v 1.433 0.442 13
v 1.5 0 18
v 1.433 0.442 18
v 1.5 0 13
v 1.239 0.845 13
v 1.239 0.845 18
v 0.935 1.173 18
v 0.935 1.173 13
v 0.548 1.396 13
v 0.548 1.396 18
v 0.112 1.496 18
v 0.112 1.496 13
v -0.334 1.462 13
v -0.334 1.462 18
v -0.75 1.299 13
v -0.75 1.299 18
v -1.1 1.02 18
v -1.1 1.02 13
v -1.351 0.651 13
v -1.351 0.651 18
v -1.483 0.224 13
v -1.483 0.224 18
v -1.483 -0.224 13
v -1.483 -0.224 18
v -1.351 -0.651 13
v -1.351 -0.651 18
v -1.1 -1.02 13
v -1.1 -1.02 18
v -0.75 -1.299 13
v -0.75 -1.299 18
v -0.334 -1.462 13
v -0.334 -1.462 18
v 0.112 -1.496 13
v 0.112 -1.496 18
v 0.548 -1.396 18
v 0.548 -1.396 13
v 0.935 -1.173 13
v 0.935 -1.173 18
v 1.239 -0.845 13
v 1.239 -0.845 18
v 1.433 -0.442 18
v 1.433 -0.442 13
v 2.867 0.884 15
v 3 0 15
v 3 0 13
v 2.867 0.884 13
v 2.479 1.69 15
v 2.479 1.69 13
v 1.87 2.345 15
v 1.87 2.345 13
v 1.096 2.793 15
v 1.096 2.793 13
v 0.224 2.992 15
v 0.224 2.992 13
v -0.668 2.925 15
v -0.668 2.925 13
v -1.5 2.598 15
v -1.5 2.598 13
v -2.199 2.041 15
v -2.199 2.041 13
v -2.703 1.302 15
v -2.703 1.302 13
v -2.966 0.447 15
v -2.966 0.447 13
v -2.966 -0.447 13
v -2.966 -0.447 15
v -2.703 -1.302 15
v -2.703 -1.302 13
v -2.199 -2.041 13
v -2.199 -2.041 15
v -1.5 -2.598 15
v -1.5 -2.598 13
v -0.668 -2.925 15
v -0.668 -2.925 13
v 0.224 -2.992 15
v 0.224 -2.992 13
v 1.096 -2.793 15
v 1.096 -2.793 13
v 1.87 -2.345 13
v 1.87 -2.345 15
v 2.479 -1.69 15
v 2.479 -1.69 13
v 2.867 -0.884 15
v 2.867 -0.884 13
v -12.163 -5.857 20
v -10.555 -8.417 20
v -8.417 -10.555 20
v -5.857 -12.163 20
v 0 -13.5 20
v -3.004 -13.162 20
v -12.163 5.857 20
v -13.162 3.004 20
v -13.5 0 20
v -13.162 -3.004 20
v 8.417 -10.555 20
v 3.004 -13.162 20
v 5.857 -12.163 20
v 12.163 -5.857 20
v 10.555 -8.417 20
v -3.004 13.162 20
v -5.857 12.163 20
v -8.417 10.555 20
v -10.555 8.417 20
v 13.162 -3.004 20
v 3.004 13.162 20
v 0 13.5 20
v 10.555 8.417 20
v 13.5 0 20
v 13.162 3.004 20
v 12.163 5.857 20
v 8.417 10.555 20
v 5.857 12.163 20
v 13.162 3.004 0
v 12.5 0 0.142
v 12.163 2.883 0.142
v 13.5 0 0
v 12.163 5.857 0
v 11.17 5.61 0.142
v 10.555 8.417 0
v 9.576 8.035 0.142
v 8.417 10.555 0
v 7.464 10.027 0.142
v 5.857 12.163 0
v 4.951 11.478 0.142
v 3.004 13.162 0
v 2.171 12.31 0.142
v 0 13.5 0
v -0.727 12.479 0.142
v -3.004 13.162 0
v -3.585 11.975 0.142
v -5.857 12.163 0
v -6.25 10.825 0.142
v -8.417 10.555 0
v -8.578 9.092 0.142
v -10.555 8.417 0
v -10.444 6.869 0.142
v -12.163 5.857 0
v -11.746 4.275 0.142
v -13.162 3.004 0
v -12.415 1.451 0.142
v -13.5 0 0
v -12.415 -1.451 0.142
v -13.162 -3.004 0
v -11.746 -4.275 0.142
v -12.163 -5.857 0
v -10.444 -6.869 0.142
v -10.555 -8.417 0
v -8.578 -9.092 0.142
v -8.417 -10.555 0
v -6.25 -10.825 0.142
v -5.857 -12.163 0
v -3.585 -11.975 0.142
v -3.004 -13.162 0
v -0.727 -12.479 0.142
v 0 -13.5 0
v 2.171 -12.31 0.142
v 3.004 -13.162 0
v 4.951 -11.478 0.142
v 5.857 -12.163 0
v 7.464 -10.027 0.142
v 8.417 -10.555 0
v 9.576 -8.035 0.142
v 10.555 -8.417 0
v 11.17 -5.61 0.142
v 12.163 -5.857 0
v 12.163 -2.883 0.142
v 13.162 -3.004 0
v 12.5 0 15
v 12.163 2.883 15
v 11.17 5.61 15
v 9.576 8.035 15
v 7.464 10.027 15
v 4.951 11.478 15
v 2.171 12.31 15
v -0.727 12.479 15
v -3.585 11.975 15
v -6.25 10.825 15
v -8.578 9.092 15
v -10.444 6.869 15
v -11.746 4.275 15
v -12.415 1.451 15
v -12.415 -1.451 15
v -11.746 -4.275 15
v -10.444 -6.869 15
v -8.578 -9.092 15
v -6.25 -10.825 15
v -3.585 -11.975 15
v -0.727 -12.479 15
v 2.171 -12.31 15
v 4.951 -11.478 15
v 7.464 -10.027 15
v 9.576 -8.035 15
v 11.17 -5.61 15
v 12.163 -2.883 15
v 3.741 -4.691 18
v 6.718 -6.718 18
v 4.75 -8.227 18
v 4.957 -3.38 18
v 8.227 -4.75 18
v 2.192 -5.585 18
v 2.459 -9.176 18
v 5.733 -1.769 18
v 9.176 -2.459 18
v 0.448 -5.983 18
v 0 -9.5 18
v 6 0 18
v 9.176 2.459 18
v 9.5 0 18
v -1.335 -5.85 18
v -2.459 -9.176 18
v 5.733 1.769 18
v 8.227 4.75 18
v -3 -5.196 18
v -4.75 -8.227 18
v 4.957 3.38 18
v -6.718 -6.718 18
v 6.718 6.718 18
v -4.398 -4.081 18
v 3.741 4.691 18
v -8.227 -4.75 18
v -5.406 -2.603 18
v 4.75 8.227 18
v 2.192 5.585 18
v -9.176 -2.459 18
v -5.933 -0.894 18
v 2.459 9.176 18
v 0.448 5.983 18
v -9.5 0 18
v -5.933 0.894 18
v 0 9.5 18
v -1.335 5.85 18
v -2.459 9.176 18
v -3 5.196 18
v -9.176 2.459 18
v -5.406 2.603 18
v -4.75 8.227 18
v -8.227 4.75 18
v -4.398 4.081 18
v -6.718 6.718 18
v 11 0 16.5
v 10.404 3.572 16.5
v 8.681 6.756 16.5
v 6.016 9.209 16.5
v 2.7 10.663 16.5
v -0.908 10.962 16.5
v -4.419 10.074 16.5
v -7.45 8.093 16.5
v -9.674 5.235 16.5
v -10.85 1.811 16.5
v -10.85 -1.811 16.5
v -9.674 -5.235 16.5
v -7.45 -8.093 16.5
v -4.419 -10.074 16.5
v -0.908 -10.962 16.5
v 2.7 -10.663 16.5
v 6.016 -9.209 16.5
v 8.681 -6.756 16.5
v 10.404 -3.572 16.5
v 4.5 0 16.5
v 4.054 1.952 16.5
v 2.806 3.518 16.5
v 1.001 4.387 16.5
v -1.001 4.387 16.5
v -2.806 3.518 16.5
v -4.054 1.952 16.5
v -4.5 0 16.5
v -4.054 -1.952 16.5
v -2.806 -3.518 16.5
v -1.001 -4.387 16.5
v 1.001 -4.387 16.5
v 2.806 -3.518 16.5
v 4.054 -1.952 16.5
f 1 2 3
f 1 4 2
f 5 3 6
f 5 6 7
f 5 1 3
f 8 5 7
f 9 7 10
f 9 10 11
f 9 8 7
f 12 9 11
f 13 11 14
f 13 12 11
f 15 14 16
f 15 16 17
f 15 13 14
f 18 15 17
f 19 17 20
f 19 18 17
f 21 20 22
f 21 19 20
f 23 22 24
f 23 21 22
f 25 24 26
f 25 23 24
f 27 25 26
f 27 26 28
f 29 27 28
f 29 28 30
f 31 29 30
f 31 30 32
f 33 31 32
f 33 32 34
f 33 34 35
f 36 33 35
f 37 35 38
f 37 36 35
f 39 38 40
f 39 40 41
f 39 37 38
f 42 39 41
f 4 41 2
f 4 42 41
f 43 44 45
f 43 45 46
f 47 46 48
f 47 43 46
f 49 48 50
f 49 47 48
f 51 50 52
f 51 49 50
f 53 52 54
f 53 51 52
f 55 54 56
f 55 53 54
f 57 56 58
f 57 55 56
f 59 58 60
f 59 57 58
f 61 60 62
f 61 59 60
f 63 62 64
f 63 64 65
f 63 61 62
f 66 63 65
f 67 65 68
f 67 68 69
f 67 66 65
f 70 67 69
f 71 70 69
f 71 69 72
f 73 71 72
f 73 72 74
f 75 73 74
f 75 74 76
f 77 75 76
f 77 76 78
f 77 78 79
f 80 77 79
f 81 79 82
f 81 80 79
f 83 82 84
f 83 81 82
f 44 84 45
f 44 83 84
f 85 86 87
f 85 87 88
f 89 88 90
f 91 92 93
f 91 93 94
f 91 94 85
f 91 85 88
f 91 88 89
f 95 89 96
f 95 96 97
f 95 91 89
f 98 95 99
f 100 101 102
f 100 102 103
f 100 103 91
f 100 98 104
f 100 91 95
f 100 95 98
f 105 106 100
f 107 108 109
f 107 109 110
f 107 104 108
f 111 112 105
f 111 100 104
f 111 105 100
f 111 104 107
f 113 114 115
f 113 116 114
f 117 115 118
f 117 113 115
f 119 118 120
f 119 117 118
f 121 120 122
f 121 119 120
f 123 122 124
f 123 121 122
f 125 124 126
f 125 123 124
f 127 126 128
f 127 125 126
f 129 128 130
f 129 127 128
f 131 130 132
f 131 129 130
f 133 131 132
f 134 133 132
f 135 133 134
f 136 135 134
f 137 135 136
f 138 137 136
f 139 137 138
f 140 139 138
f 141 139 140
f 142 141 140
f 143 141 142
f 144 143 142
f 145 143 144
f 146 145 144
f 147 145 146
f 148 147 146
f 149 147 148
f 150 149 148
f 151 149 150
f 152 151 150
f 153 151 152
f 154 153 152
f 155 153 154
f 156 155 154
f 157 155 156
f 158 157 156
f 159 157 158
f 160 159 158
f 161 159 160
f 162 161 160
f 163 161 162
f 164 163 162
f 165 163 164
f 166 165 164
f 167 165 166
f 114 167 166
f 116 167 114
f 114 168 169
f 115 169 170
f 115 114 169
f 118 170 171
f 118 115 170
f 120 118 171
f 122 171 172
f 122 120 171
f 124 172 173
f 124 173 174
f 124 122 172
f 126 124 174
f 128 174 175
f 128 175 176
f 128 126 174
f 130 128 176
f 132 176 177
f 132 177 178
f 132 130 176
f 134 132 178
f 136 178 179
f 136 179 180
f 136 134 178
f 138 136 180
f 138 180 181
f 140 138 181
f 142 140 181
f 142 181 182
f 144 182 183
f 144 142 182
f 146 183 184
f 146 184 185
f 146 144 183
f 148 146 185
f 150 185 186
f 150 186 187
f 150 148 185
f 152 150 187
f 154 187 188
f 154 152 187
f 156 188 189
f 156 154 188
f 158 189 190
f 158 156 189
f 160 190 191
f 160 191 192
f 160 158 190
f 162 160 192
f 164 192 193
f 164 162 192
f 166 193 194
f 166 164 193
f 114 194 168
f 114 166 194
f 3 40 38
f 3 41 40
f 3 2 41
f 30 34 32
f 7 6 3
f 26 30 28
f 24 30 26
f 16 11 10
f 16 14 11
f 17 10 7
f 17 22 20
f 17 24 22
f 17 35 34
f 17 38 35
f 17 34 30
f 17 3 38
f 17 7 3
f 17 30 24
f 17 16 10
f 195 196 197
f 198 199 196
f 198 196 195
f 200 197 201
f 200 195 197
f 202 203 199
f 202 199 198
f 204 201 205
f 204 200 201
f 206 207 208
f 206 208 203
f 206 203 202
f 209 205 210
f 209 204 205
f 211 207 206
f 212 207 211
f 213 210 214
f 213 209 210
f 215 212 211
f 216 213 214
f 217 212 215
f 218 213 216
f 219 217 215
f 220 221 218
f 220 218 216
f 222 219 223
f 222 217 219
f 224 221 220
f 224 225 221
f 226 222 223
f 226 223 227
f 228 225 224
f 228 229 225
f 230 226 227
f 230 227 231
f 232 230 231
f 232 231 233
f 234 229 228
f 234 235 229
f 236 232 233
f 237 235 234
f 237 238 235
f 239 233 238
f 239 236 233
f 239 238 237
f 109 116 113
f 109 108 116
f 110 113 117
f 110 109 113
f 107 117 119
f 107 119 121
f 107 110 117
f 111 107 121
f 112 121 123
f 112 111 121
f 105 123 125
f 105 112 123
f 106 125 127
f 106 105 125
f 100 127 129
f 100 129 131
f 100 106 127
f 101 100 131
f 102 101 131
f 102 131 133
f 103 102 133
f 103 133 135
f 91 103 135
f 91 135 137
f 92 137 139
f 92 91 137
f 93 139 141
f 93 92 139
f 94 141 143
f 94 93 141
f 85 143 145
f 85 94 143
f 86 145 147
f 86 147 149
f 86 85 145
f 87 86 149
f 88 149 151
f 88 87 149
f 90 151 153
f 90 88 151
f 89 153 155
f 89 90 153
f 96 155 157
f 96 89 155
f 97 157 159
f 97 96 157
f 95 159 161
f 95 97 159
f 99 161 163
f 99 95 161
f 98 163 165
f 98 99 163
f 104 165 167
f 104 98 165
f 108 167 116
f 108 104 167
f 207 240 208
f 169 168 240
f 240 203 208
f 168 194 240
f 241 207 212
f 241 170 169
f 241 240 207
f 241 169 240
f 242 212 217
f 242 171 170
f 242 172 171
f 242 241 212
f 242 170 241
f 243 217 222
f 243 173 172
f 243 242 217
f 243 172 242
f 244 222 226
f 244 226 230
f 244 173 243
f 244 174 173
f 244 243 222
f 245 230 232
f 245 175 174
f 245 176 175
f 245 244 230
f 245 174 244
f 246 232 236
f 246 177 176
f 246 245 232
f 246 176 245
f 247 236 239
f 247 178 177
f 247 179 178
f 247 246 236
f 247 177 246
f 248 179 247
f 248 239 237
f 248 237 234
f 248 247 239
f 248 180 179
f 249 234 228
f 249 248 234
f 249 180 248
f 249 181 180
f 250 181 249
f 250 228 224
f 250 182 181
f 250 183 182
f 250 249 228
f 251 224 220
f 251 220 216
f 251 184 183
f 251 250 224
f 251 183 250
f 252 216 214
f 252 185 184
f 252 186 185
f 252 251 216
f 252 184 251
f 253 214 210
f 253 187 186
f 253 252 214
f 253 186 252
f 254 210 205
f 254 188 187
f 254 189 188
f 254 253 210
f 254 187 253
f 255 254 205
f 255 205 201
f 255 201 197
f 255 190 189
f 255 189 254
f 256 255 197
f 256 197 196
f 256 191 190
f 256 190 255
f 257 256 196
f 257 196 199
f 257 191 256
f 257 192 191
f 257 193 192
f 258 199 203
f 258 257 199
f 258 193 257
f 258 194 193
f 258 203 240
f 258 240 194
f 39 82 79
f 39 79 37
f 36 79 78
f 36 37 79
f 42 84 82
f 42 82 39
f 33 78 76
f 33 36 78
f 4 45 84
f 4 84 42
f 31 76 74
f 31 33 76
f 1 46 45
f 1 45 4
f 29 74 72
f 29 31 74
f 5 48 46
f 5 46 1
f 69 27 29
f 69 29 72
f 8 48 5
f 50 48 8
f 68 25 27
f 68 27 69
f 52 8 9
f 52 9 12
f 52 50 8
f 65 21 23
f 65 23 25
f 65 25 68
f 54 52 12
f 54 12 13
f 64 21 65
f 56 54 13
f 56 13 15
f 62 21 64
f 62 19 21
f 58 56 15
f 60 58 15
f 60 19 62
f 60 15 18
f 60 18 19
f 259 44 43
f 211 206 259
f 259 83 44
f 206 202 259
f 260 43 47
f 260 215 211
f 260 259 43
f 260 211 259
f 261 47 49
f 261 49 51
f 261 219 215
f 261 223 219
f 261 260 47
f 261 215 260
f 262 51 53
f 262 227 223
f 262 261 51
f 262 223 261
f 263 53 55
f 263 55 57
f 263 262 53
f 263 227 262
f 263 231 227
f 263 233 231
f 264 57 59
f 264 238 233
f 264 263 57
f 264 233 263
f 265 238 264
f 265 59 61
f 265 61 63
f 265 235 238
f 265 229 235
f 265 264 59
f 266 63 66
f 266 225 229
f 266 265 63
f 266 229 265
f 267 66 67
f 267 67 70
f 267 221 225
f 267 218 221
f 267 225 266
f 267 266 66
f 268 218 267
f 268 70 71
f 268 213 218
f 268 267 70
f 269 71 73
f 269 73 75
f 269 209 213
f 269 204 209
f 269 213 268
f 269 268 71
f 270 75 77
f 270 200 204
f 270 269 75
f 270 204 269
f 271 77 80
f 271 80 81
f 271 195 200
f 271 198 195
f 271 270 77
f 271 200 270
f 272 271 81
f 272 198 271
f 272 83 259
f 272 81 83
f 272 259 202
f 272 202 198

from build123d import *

# Parameters (mm, degrees)
F2_SIZE = 3


with BuildPart() as f1:
    # F0 (on Front) → F1 (revolve)
    with BuildSketch(Plane.XZ):
        Polygon((13.5, 20), (0, 20), (0, 18), (1.5, 18), (1.5, 13), (3, 13), (3, 18), (12.5, 18), (12.5, 0.142242), (13.5, 0), align=None)
    revolve(axis=Axis((0, 0, 25.805777), (0, 0, 1)))

    # F2
    f2_edges = [f1.edges().sort_by_distance(p)[0] for p in [
        (-3, 0, 18),
        (-12.5, 0, 18),
    ]]
    chamfer(f2_edges, length=F2_SIZE)


solid = f1.part
